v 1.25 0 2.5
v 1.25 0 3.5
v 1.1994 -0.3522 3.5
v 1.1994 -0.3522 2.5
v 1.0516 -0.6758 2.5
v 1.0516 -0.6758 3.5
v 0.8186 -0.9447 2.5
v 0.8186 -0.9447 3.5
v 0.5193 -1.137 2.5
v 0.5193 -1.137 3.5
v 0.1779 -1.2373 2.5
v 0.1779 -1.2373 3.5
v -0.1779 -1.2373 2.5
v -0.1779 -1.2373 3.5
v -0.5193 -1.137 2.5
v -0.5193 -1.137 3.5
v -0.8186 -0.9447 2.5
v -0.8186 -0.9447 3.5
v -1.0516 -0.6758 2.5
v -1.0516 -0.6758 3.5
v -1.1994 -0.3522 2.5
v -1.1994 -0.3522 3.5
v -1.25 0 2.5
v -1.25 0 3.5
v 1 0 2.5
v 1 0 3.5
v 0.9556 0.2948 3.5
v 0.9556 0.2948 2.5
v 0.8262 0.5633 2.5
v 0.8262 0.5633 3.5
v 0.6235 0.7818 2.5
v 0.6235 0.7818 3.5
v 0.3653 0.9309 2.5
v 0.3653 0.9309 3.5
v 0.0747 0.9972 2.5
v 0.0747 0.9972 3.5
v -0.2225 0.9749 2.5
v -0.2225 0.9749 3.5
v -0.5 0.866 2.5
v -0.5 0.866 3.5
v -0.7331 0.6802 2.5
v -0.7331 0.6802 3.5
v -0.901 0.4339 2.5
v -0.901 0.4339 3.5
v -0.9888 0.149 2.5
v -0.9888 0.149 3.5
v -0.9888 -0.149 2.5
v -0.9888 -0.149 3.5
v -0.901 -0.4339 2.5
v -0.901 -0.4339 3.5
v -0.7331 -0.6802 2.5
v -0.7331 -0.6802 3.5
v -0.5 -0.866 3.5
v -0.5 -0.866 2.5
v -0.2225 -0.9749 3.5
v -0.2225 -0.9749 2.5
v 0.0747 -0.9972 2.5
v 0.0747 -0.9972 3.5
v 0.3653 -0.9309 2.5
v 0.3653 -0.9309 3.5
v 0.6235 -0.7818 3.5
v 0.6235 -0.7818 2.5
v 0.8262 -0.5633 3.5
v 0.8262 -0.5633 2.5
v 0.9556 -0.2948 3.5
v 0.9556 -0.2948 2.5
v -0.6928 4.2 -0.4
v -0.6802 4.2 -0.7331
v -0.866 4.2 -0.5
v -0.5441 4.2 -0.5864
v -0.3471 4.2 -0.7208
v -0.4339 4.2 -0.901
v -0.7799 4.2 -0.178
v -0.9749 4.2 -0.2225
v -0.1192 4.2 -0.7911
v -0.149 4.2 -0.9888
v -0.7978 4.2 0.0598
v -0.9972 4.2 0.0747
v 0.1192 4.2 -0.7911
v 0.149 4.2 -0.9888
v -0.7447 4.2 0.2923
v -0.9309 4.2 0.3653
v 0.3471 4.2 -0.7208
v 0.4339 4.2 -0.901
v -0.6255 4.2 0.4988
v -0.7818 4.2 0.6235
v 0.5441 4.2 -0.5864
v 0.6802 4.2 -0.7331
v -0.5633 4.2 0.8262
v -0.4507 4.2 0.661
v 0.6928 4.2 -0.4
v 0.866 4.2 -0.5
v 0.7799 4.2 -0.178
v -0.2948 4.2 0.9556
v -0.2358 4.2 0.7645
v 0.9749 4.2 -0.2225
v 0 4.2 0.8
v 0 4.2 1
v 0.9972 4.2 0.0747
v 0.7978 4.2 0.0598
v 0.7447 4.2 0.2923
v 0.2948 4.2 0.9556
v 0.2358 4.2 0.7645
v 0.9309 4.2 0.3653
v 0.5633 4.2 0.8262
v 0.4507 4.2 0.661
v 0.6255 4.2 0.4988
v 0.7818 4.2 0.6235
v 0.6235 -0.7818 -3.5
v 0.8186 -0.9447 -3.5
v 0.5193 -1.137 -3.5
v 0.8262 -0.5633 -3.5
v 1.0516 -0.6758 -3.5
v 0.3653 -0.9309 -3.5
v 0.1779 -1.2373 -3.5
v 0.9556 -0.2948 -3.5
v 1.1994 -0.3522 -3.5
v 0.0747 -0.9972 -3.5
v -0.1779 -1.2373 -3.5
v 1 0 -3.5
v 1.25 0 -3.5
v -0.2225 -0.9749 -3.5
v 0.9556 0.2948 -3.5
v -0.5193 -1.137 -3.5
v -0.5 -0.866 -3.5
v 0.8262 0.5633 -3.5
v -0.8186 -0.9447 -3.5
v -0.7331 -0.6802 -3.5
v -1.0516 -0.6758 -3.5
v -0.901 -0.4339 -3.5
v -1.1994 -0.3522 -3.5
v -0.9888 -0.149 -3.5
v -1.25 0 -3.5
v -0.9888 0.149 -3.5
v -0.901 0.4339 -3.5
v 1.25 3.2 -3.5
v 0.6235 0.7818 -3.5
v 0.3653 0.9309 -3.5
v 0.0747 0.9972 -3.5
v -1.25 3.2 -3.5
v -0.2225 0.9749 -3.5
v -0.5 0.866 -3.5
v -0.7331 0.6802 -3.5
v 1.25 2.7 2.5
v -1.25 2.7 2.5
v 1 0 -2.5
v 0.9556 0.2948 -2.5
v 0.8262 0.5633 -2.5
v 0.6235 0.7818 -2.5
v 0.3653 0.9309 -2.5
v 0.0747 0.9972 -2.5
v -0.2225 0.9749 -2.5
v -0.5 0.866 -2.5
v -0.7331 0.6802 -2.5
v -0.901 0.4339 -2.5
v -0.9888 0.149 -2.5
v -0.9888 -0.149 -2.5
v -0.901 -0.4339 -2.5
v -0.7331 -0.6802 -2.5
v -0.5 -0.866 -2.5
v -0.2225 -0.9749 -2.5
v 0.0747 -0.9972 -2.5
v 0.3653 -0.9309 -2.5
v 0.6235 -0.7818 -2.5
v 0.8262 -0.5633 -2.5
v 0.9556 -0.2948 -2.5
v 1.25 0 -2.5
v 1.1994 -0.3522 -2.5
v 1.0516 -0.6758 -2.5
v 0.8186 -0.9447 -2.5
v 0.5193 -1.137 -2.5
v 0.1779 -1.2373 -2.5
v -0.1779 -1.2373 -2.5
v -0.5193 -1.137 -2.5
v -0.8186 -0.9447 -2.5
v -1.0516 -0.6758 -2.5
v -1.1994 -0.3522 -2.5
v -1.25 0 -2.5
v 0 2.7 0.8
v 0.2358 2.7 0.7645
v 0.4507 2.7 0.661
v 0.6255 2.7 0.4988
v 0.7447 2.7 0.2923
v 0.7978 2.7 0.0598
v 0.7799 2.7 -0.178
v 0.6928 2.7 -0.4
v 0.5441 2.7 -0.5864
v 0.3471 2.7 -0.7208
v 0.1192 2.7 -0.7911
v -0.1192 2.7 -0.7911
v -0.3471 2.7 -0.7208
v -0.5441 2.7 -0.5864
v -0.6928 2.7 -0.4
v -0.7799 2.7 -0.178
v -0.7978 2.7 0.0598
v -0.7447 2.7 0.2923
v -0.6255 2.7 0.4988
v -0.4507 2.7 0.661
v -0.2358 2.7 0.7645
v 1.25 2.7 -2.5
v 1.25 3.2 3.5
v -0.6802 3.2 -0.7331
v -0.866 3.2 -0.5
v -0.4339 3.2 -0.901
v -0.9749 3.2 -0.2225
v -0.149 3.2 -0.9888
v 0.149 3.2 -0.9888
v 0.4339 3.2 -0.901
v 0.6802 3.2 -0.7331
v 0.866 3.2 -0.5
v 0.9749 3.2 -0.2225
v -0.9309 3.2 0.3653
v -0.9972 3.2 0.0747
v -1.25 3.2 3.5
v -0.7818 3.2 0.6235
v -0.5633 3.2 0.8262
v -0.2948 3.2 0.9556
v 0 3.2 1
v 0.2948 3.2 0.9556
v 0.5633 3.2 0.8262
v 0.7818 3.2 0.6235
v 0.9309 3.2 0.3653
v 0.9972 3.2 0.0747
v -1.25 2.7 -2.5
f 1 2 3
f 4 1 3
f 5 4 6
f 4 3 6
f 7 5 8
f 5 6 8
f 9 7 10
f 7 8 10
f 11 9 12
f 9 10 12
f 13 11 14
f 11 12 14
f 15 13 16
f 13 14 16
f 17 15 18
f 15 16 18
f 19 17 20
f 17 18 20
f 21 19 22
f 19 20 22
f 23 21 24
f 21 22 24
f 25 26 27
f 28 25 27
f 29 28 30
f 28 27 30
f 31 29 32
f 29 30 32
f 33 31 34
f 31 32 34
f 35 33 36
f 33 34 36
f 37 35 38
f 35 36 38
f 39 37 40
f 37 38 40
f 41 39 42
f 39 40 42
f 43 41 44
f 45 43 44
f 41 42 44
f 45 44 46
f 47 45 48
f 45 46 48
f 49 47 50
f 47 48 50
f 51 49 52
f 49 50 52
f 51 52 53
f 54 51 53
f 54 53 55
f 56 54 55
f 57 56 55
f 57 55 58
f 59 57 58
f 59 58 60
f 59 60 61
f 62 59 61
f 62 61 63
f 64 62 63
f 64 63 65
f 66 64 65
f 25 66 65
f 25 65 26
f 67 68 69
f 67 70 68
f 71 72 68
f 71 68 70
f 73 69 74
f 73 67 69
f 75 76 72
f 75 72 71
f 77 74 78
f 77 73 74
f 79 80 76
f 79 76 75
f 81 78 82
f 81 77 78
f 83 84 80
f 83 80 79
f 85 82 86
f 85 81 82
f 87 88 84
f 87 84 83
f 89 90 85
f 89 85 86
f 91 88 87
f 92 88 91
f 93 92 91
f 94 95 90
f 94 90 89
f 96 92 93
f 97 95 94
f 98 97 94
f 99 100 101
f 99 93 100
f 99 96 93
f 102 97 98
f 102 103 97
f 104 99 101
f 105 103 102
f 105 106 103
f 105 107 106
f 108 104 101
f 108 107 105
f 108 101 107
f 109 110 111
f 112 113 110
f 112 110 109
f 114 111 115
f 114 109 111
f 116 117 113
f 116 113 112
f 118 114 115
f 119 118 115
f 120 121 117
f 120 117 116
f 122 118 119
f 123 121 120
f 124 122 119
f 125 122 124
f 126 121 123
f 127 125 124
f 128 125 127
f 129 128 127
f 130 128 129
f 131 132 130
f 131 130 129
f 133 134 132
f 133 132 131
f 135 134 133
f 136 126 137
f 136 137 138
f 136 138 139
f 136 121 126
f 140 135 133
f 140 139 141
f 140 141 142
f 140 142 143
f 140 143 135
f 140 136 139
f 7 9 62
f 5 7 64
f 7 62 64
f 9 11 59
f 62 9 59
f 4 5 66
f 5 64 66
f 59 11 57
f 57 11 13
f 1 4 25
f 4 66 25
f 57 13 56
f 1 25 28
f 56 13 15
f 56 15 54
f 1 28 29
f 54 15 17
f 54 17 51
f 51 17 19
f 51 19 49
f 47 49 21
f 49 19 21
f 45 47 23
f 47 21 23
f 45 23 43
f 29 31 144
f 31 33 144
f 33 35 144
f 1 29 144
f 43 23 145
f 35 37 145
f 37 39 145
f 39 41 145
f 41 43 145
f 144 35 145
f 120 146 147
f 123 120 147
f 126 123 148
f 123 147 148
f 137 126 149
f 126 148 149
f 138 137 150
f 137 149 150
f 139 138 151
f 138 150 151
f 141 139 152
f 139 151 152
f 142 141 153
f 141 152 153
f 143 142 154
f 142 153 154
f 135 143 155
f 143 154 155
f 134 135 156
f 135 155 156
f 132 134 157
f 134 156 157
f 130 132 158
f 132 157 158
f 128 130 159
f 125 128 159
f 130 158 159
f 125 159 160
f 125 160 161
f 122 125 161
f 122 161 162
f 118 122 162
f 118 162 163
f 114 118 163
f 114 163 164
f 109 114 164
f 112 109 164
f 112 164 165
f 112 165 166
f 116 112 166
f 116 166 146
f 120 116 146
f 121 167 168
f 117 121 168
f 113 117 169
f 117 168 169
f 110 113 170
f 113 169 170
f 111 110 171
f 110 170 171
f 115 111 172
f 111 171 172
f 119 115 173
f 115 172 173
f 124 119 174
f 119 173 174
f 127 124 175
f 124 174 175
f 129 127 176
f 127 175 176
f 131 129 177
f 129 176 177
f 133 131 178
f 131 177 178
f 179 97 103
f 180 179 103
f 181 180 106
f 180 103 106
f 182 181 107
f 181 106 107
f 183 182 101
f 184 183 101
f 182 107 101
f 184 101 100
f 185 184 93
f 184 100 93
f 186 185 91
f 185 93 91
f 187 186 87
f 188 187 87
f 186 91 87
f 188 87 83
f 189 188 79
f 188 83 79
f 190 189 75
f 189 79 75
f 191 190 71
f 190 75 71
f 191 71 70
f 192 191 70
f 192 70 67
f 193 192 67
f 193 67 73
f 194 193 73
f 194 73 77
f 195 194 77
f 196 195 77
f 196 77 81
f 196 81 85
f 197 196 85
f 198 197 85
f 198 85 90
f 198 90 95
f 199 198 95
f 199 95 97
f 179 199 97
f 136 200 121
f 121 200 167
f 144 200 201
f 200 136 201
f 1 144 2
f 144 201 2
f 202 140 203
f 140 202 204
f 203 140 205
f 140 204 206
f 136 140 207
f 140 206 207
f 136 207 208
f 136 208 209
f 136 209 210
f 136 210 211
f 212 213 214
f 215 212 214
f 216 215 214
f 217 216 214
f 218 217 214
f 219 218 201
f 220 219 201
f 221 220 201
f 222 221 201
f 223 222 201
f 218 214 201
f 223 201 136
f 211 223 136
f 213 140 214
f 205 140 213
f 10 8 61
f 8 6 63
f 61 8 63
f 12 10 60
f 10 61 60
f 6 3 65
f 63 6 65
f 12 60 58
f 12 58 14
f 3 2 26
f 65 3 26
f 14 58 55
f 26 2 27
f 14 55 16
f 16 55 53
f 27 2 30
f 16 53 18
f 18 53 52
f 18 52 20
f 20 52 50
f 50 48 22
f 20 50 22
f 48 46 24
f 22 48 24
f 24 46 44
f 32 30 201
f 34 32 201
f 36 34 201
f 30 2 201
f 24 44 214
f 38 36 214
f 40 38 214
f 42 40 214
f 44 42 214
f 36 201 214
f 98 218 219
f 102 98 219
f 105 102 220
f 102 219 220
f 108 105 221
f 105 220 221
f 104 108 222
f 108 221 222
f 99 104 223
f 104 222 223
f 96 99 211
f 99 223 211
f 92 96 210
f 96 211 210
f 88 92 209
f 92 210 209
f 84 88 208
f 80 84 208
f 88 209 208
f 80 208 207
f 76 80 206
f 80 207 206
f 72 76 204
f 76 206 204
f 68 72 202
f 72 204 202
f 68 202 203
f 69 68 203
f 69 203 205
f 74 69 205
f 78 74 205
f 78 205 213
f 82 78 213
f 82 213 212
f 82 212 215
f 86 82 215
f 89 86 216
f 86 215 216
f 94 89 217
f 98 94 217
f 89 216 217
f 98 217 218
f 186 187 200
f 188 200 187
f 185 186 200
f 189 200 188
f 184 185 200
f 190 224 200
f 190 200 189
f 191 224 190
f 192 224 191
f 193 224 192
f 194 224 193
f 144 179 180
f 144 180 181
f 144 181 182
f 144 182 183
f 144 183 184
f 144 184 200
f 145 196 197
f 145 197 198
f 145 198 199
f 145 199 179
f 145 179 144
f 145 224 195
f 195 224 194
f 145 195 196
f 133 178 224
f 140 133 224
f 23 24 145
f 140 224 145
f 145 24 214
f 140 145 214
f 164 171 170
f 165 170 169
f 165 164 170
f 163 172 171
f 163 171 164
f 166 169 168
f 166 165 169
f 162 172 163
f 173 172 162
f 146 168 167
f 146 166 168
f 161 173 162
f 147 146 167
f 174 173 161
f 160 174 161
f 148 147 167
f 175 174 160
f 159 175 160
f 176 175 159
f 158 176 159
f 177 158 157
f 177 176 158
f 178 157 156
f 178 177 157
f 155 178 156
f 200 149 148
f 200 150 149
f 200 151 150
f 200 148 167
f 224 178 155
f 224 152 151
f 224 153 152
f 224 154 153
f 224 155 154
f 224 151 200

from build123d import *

# Parameters (mm, degrees)
BOSS_EXTRUDE2_DEPTH = 3.5
SKETCH4_R           = 1
CUT_EXTRUDE1_DEPTH  = 8.797595783
SKETCH5_W           = 5
SKETCH5_H           = 3.95
CUT_EXTRUDE2_DEPTH  = 6
SKETCH7_R           = 1
BOSS_EXTRUDE3_DEPTH = 1
SKETCH8_R           = 0.8
CUT_EXTRUDE3_DEPTH  = 2


with BuildPart() as part:
    # Sketch1 → Boss-Extrude2 (new, symmetric)
    with BuildSketch(Plane.XY):
        with BuildLine():
            Line((-1.25, 0), (-1.25, 3.2))
            Line((-1.25, 3.2), (1.25, 3.2))
            Line((1.25, 3.2), (1.25, 0))
            ThreePointArc((1.25, 0), (0, -1.25), (-1.25, 0))
        make_face()
    extrude(amount=BOSS_EXTRUDE2_DEPTH, both=True)

    # Sketch4 → Cut-Extrude1 (cut, through all)
    with BuildSketch(Plane.XY.offset(3.5)):
        Circle(SKETCH4_R)
    extrude(amount=-CUT_EXTRUDE1_DEPTH, mode=Mode.SUBTRACT)

    # Sketch5 → Cut-Extrude2 (cut)
    with BuildSketch(Plane.ZY.offset(1.25)):
        with Locations((0, 0.725)):
            Rectangle(SKETCH5_W, SKETCH5_H)
    extrude(amount=-CUT_EXTRUDE2_DEPTH, mode=Mode.SUBTRACT)

    # Sketch7 → Boss-Extrude3 (add)
    with BuildSketch(Plane(origin=(0, 3.2, 0), x_dir=(1, 0, 0), z_dir=(0, 1, 0))):
        with Locations(Location((0, 0, 0), (0, 0, 270))):
            Circle(SKETCH7_R)
    extrude(amount=BOSS_EXTRUDE3_DEPTH)

    # Sketch8 → Cut-Extrude3 (cut)
    with BuildSketch(Plane(origin=(0, 4.2, 0), x_dir=(1, 0, 0), z_dir=(0, 1, 0))):
        with Locations(Location((0, 0, 0), (0, 0, 270))):
            Circle(SKETCH8_R)
    extrude(amount=-CUT_EXTRUDE3_DEPTH, mode=Mode.SUBTRACT)


solid = part.part
